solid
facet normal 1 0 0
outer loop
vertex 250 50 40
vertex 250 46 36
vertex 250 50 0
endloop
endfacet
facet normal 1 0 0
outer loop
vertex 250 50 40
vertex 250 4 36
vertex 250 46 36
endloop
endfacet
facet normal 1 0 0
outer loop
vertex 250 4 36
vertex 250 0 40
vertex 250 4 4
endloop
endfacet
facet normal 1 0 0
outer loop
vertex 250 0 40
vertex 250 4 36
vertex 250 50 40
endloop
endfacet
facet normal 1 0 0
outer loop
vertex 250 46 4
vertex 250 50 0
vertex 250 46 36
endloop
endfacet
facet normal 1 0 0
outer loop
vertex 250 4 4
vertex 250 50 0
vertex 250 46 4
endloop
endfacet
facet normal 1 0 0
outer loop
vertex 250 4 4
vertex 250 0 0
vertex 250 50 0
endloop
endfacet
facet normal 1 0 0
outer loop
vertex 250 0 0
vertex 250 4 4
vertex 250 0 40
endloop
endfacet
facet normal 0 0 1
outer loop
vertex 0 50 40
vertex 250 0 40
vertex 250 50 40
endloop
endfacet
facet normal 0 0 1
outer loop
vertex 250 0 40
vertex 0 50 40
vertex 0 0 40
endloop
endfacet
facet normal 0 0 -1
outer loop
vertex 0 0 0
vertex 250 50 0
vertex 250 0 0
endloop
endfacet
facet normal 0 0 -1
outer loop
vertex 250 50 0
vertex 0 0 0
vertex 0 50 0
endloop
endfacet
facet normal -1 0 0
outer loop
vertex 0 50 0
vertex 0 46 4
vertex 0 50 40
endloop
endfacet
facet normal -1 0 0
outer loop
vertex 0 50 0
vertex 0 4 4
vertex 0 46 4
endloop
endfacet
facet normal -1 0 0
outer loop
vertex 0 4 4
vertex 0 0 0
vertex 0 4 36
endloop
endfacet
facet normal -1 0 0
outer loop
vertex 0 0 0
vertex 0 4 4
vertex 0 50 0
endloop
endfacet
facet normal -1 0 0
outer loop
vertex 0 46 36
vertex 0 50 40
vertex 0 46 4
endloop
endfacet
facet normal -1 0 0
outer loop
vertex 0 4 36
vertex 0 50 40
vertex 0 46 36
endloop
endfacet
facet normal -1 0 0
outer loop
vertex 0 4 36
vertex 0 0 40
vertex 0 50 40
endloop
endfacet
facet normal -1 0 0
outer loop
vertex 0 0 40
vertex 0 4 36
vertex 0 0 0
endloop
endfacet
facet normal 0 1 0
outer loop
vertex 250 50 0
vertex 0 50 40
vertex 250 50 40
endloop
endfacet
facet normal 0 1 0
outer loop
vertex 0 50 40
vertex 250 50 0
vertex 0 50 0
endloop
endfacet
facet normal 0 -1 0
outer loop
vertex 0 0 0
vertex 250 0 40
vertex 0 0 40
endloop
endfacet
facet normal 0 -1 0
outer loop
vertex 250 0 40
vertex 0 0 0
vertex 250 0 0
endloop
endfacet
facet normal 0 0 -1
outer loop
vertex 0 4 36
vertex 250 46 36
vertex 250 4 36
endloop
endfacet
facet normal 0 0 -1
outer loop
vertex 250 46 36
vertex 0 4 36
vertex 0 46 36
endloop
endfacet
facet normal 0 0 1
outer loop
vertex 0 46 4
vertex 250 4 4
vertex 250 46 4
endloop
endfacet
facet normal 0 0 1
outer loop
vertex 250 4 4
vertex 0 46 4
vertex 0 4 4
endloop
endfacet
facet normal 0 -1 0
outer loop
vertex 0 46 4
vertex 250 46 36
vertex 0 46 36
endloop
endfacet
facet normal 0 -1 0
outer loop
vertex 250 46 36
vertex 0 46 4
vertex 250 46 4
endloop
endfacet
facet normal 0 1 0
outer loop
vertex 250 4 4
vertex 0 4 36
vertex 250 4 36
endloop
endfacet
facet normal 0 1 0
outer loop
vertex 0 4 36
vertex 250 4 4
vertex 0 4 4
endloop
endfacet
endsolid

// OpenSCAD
$fn = 32;

// ----------------------------------------------------------------------
// Box beam: 200-250 mm hollow beam
// ----------------------------------------------------------------------

// --- parameters (mm) ---
beam_l = 250;             // beam length, X
beam_w = 50;              // beam width, Y
beam_h = 40;              // beam height, Z
wall = 4;                 // wall thickness
fit_tol = 0.1;            // tolerance for press fits, mm
free_tol = 0.5;           // tolerance for clearance fits, mm

difference() {
  cube([beam_l, beam_w, beam_h]);
  translate([-1, wall, wall])
    cube([beam_l + 2, beam_w - 2 * wall, beam_h - 2 * wall]);
}
